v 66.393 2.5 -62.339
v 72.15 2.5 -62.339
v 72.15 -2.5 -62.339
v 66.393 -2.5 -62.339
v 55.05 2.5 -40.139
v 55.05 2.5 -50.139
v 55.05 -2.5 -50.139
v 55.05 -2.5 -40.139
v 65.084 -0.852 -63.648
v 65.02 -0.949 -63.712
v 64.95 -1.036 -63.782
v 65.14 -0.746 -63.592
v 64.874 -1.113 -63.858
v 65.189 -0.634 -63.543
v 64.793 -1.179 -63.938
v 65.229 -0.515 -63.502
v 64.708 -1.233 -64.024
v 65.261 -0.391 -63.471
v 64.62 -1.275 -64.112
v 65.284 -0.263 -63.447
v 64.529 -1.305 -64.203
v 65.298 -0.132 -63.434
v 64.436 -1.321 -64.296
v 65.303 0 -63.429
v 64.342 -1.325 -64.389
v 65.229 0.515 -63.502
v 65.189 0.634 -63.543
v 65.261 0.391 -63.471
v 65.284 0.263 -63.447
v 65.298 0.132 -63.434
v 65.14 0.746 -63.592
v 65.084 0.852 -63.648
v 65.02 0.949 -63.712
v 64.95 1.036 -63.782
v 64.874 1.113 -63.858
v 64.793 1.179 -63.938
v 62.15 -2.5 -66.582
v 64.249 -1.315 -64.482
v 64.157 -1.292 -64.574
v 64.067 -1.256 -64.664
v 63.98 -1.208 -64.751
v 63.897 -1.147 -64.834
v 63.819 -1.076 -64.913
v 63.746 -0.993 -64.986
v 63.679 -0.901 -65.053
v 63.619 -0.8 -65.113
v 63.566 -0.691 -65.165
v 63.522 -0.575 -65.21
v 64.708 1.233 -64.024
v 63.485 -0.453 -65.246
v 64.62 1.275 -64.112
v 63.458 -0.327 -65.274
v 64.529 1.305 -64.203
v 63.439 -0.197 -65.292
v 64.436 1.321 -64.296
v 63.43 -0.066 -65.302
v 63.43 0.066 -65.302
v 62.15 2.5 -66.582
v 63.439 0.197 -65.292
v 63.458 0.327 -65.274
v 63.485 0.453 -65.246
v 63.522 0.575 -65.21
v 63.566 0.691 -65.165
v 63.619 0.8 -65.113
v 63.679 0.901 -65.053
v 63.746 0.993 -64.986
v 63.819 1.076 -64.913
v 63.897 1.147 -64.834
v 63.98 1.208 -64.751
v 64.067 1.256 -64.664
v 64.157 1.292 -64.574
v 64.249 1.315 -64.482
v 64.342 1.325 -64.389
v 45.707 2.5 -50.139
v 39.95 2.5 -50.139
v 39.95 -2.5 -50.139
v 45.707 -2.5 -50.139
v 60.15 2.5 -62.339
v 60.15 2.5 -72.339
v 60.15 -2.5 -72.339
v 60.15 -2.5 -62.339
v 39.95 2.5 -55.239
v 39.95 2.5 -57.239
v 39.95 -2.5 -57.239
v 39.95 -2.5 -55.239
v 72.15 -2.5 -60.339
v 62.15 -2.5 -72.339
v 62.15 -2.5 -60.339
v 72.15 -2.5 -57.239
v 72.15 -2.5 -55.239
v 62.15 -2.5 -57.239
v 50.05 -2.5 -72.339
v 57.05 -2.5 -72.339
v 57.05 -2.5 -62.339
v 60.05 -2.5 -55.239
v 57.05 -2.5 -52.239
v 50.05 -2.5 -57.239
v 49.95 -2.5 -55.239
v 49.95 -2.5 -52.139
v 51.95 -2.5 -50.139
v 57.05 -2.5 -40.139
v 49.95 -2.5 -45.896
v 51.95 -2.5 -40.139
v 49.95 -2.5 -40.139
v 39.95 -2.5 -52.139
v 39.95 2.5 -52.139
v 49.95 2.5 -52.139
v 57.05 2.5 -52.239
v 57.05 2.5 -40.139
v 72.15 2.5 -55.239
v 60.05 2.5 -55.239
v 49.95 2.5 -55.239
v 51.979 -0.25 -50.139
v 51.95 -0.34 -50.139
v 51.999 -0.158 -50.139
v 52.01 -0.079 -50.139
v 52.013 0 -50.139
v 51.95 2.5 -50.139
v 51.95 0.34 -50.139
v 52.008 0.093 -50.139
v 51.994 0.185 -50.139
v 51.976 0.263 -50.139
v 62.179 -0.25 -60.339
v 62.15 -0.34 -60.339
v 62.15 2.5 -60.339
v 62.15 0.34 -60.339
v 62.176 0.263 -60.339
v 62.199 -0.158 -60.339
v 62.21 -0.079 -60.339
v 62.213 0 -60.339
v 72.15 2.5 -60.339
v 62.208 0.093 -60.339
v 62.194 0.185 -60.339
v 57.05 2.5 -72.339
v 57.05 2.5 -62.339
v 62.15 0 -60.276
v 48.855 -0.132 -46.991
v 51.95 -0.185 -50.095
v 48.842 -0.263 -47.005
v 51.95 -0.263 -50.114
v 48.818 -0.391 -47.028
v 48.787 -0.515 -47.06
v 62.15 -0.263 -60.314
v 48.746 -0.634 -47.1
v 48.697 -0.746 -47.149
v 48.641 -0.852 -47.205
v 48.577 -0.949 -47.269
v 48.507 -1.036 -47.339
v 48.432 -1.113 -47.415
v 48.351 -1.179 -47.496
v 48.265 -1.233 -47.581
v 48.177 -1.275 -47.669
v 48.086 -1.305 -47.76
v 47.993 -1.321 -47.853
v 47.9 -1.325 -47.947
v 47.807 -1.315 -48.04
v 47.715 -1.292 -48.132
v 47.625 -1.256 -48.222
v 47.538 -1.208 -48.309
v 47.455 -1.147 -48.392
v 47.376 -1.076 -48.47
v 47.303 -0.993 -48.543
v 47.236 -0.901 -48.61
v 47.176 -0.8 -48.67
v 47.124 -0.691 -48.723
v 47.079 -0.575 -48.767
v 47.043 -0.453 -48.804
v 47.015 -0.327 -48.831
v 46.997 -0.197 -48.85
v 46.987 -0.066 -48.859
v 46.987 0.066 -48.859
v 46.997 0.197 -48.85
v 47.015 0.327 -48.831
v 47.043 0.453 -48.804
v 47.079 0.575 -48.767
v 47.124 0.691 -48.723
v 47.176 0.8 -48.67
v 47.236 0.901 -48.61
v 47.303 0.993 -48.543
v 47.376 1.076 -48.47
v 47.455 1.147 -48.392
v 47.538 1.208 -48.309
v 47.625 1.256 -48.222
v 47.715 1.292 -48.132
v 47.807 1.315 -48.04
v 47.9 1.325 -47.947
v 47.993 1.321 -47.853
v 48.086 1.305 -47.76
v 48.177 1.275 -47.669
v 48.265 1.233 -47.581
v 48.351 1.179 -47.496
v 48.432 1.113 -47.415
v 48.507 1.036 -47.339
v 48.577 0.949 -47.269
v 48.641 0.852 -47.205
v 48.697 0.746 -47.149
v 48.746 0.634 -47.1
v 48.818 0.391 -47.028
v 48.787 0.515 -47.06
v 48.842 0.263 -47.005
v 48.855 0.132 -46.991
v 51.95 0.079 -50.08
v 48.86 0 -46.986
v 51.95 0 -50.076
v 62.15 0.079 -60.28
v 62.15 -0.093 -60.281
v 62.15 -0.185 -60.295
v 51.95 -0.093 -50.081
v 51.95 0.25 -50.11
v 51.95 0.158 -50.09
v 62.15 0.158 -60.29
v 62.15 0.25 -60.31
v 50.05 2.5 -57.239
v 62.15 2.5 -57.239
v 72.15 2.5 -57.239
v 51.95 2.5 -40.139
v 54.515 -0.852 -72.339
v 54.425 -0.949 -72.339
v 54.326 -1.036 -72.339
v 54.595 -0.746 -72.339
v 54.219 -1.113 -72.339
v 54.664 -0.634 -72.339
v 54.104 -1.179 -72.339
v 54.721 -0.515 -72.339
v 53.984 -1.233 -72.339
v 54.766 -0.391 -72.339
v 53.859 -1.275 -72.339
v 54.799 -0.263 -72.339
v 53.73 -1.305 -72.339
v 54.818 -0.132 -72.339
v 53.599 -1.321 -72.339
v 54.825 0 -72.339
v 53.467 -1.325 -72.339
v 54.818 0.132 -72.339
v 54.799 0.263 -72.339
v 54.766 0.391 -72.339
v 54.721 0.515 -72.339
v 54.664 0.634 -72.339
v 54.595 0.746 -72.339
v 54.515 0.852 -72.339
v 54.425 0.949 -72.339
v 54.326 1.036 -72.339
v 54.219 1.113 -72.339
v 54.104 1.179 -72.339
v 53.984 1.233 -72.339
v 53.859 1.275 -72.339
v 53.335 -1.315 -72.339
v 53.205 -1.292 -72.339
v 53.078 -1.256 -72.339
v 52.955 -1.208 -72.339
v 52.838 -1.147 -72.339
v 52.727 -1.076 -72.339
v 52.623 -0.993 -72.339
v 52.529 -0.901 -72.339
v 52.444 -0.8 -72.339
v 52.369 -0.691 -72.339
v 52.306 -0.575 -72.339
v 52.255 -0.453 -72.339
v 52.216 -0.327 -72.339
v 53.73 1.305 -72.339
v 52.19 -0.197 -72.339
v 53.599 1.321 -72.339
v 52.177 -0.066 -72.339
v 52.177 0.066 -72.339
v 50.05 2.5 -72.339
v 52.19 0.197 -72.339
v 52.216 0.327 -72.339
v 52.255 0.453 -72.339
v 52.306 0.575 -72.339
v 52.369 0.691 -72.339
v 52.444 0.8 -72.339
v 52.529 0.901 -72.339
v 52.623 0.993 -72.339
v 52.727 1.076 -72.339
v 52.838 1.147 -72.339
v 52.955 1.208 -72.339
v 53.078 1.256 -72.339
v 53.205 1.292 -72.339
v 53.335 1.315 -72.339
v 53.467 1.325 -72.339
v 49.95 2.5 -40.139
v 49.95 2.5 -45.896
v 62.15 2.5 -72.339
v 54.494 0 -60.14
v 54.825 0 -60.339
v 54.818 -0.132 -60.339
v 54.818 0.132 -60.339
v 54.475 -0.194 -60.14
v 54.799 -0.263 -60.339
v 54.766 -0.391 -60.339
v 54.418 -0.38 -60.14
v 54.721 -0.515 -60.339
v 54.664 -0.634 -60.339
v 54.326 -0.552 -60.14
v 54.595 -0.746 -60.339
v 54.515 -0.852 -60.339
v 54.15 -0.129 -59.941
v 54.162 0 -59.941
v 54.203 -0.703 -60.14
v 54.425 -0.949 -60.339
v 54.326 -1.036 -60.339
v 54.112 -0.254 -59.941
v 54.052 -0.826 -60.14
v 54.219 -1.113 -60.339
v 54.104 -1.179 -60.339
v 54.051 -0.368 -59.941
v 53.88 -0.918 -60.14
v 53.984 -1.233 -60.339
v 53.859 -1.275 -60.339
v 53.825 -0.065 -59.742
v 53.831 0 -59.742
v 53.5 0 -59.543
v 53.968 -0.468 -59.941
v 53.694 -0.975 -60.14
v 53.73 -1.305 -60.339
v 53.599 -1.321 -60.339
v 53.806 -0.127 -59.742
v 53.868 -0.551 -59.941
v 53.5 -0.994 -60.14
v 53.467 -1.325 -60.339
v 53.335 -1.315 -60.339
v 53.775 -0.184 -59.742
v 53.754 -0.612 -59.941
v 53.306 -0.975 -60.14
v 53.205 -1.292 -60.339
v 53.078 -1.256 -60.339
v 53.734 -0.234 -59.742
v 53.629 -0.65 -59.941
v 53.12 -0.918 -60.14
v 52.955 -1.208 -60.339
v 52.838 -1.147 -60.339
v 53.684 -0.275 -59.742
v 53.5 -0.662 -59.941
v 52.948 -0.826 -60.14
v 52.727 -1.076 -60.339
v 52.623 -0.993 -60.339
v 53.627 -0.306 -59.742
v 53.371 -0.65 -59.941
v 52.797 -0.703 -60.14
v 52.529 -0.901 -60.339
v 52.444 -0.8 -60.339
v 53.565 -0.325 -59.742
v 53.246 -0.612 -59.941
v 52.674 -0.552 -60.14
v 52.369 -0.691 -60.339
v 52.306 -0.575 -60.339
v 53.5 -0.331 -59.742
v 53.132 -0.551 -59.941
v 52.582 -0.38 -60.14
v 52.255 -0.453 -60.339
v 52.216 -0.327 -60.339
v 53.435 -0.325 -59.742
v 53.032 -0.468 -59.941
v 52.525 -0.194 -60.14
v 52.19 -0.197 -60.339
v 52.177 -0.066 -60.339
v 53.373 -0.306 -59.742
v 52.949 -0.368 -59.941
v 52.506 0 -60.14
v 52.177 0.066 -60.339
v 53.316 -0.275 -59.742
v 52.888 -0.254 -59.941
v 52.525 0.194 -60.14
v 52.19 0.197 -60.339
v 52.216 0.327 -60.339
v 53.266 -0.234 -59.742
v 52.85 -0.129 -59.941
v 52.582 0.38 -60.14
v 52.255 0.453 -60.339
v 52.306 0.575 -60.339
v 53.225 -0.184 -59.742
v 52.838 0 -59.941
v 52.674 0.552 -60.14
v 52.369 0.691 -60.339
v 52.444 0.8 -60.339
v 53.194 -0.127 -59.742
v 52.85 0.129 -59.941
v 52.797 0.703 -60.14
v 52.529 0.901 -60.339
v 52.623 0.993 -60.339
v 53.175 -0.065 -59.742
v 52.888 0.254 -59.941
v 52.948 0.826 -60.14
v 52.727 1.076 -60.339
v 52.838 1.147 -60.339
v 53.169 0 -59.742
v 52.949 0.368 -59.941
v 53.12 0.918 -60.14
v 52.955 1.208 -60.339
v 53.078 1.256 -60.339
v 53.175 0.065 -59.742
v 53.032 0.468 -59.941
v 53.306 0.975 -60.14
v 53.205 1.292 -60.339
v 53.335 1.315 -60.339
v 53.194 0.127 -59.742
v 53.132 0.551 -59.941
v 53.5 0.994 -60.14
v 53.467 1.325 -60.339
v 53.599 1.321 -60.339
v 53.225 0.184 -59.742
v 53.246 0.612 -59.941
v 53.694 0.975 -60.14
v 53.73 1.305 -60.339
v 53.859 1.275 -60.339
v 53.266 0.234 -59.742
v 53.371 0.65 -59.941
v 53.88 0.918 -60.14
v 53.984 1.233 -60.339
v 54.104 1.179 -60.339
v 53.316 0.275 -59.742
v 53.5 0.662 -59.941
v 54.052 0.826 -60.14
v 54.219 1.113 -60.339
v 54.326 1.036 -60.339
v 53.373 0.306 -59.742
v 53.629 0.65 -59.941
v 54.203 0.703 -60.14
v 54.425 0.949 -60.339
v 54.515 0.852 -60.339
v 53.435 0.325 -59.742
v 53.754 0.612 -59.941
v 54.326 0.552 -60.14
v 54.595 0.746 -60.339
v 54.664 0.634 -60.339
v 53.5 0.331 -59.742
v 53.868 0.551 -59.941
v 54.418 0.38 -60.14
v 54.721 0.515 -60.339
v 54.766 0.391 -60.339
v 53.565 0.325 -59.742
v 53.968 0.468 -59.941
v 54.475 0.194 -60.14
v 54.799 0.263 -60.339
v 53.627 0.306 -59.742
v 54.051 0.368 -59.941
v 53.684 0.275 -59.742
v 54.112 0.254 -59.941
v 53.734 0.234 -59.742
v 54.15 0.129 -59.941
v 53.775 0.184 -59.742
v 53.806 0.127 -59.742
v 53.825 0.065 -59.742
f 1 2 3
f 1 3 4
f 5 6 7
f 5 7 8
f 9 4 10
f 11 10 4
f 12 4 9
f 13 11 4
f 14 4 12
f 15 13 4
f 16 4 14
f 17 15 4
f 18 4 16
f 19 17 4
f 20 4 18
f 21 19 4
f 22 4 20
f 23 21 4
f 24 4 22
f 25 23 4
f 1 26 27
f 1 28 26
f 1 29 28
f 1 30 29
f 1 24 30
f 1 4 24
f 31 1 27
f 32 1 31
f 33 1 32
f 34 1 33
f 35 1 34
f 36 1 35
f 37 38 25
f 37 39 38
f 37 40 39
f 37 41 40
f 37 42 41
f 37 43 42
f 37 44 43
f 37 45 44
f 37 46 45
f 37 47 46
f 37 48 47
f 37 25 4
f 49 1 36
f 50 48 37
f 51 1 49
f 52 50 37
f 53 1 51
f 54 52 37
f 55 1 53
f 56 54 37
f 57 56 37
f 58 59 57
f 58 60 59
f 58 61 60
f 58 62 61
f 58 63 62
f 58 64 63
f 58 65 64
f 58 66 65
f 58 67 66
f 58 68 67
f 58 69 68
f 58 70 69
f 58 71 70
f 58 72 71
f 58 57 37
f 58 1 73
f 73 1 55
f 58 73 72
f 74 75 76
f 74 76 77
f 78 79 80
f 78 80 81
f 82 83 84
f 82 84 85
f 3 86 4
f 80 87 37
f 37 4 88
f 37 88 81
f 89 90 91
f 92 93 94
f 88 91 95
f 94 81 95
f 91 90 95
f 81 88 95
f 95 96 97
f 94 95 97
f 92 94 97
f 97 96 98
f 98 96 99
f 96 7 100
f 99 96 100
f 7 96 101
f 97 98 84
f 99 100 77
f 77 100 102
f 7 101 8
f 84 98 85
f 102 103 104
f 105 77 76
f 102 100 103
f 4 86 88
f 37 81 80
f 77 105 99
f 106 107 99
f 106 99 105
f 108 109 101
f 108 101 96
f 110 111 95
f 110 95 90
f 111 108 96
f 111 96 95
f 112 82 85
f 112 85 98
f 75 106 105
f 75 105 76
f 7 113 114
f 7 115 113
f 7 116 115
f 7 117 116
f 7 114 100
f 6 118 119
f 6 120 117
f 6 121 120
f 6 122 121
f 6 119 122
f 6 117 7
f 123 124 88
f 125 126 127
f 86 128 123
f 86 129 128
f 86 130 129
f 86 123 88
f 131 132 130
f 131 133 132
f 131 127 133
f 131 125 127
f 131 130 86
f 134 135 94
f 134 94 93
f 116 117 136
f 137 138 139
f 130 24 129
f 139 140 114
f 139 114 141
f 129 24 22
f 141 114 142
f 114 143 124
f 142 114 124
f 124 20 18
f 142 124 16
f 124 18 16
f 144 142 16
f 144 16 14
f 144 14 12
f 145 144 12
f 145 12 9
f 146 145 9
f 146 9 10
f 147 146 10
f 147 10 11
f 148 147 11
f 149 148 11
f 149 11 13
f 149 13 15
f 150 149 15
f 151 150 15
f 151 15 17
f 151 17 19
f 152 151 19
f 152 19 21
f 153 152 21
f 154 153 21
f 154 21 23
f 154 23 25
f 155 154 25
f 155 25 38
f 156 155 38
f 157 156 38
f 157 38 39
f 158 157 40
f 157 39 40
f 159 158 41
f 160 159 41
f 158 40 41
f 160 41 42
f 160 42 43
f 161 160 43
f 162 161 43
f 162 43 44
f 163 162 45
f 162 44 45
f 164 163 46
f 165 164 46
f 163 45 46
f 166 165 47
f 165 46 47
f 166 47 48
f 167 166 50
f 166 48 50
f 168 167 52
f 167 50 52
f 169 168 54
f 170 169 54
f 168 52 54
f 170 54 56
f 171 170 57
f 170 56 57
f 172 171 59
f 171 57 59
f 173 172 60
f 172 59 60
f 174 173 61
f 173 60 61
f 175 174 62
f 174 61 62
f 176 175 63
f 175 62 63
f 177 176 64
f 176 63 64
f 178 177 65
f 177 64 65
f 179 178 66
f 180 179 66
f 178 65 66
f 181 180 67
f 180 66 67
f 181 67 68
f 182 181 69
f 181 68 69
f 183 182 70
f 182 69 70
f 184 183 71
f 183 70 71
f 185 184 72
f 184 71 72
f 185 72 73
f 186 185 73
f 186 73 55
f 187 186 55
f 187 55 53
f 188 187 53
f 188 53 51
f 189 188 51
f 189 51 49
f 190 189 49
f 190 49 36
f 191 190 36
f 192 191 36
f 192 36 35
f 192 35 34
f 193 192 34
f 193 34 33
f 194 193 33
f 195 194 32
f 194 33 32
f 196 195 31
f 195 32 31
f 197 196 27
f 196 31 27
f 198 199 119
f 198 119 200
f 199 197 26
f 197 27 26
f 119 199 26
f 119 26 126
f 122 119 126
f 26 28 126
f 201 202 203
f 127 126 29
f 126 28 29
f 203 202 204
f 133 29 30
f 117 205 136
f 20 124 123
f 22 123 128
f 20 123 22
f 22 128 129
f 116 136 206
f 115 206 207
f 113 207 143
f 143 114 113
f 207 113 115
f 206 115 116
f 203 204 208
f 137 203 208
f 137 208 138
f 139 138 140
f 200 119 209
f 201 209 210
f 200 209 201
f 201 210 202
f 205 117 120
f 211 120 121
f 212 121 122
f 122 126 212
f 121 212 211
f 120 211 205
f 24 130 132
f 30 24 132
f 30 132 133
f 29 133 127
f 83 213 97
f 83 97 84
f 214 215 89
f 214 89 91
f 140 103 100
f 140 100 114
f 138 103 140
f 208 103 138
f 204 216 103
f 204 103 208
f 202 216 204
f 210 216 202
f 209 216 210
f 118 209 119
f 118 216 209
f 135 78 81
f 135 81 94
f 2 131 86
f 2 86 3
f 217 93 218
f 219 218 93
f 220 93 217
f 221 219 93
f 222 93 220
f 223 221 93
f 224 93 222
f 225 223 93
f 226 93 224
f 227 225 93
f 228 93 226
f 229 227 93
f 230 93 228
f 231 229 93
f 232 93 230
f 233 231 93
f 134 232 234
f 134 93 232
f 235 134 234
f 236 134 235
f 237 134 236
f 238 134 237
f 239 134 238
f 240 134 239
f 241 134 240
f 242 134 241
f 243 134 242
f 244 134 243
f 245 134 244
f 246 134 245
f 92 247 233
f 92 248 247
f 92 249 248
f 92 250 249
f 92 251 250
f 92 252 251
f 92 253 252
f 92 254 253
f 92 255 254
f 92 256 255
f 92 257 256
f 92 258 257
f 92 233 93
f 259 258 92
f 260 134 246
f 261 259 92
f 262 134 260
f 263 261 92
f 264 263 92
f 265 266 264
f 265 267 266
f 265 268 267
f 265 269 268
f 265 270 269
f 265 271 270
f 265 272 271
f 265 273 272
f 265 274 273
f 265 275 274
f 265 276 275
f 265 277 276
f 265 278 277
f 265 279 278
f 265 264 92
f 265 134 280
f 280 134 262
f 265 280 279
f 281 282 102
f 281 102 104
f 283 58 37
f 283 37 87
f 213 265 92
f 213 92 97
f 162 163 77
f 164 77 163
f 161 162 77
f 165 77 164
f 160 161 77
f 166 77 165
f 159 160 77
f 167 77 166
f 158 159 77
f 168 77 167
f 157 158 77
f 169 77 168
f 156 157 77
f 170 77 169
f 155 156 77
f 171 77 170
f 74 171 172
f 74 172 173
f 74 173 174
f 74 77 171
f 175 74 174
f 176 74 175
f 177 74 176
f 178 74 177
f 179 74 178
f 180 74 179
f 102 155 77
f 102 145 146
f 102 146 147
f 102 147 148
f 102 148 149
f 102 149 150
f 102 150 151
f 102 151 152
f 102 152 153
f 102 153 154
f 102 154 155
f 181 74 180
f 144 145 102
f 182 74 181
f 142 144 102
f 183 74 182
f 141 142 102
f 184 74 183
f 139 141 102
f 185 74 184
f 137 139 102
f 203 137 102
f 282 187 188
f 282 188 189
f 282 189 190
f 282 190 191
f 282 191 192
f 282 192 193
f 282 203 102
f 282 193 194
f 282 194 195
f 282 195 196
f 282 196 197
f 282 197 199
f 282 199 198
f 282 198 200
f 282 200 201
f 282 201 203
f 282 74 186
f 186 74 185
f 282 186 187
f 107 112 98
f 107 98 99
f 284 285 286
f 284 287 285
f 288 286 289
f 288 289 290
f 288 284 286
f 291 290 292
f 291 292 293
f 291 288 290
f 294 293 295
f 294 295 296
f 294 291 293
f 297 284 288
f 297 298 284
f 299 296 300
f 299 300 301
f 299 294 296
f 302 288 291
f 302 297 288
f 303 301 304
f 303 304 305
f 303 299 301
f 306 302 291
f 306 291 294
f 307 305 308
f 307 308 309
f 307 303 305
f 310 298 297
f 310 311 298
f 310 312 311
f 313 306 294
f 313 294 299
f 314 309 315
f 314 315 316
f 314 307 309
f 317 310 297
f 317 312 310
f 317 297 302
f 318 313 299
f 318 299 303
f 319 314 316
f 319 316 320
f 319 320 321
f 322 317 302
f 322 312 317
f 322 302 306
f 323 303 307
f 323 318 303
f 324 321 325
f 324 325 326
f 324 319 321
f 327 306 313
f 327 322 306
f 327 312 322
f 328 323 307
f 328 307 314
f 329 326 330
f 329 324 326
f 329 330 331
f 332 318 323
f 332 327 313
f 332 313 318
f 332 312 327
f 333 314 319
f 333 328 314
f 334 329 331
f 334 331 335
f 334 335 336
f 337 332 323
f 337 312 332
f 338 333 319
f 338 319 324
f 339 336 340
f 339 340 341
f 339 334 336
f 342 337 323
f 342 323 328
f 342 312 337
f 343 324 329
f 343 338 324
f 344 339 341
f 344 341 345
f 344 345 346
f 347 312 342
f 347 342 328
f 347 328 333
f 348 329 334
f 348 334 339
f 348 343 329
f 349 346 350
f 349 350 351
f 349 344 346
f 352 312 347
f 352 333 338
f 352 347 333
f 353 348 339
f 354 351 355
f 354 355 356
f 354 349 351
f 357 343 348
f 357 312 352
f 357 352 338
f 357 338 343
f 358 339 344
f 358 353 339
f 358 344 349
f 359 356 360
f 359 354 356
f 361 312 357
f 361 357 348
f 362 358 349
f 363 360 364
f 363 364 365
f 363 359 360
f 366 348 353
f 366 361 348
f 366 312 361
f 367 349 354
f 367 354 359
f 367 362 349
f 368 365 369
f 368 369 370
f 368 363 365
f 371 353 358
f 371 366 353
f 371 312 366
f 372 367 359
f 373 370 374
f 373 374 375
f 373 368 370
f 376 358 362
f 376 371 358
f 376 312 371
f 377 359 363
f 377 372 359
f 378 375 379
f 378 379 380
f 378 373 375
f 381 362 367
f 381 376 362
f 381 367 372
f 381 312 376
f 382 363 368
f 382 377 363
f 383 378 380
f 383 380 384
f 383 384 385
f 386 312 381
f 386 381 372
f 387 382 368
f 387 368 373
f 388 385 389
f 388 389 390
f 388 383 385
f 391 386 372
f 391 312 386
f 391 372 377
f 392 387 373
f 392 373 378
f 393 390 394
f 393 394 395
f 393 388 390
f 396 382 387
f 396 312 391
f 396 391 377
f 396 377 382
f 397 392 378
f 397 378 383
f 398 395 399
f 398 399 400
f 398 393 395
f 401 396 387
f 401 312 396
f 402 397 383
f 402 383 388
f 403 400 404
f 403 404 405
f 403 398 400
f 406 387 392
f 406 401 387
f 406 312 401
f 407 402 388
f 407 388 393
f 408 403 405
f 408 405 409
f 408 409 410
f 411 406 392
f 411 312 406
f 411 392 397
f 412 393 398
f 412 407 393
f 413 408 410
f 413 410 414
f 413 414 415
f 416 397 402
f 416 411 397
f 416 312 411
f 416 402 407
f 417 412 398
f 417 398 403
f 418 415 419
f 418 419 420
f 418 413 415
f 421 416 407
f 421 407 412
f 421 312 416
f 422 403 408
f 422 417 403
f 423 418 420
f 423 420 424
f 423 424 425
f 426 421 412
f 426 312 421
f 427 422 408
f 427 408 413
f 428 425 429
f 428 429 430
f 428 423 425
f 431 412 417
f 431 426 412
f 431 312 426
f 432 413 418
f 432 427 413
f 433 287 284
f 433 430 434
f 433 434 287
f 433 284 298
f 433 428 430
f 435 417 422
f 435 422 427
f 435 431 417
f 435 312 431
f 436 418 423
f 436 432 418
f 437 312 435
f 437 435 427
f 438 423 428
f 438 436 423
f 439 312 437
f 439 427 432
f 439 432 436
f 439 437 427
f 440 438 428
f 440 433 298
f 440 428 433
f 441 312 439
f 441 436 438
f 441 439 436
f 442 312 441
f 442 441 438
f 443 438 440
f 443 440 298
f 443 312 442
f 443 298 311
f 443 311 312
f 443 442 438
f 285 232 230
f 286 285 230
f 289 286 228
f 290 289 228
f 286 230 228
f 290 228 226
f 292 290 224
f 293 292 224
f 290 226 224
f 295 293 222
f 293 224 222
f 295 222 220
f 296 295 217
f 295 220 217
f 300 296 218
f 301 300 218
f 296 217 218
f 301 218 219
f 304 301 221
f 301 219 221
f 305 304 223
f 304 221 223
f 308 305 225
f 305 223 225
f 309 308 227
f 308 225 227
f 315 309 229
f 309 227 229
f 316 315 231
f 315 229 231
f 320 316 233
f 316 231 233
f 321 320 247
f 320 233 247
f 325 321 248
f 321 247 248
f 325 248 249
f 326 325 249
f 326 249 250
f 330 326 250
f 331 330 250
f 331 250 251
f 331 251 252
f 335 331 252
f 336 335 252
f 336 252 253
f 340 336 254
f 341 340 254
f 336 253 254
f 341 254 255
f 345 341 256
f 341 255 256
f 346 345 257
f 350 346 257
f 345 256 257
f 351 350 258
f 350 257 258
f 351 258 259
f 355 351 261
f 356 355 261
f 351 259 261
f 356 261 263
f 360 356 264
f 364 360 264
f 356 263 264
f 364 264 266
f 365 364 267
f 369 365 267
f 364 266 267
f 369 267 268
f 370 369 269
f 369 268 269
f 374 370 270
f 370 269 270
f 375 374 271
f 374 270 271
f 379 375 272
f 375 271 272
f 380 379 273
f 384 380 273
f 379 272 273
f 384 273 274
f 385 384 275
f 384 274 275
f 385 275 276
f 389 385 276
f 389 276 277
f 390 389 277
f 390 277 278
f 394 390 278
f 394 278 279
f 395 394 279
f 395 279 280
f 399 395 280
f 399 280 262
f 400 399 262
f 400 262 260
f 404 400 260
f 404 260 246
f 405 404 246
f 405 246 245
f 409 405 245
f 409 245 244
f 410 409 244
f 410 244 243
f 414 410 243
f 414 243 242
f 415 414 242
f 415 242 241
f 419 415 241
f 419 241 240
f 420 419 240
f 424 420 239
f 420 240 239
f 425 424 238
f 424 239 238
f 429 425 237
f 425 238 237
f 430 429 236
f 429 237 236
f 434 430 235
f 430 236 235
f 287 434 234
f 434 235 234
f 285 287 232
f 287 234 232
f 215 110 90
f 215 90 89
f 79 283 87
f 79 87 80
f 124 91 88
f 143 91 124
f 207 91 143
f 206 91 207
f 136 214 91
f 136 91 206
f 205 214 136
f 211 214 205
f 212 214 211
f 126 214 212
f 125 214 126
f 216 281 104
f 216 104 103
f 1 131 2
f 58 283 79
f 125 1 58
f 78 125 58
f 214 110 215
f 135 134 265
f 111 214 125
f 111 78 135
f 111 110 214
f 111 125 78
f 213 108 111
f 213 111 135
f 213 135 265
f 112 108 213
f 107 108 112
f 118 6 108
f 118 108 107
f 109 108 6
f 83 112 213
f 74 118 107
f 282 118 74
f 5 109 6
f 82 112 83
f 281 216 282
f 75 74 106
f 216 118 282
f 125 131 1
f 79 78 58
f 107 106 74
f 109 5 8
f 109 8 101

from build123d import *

# Parameters (mm, degrees)
PAD004_DEPTH   = 5
SKETCH009_R    = 1.325
HOLE004_DEPTH  = 34.3965410847
SKETCH010_R    = 1.325
HOLE005_DEPTH  = 12
HOLE005_TIPS_R = 1.325


with BuildPart() as part:
    # Sketch008 → Pad004 (new body)
    with BuildSketch(Plane.XZ.offset(-2.5)):
        Polygon((49.95, -40.139016), (51.95, -40.139016), (51.95, -50.139016), (55.05, -50.139016), (55.05, -40.139016), (57.05, -40.139016), (57.05, -52.239016), (60.05, -55.239016), (72.15, -55.239016), (72.15, -57.239016), (62.15, -57.239016), (62.15, -60.339016), (72.15, -60.339016), (72.15, -62.339016), (66.3926406871, -62.339016), (62.15, -66.5816566871), (62.15, -72.339016), (60.15, -72.339016), (60.15, -62.339016), (57.05, -62.339016), (57.05, -72.339016), (50.05, -72.339016), (50.05, -57.239016), (39.95, -57.239016), (39.95, -55.239016), (49.95, -55.239016), (49.95, -52.139016), (39.95, -52.139016), (39.95, -50.139016), (45.7073593129, -50.139016), (49.95, -45.8963753129), align=None)
    extrude(amount=PAD004_DEPTH)

    # Sketch009 (on Face7 of Pad004) → Hole004 (cut, through all)
    with BuildSketch(Plane(origin=(64.3658283436, 0, -64.3658283436), x_dir=(0.7071067812, 0, 0.7071067812), z_dir=(0.7071067812, 0, -0.7071067812))):
        Circle(SKETCH009_R)
    extrude(amount=-HOLE004_DEPTH, mode=Mode.SUBTRACT)

    # Sketch010 (on Face17 of Hole004) → Hole005 (cut)
    with BuildSketch(Plane(origin=(0, 0, -72.339016), x_dir=(1, 0, 0), z_dir=(0, 0, -1))):
        with Locations((53.5, 0)):
            Circle(SKETCH010_R)
    extrude(amount=-HOLE005_DEPTH, mode=Mode.SUBTRACT)

    # Hole005 tips → Hole005 tip 1 section 0
    with BuildSketch(Plane(origin=(0, 0, -60.339016), x_dir=(1, 0, 0), z_dir=(0, 0, -1)), mode=Mode.PRIVATE) as hole005_tip_1_s0:
        with Locations((53.5, 0)):
            Circle(HOLE005_TIPS_R)
    loft([hole005_tip_1_s0.sketch, Vertex(53.5, 0, -59.5428756798)], mode=Mode.SUBTRACT)


solid = part.part
